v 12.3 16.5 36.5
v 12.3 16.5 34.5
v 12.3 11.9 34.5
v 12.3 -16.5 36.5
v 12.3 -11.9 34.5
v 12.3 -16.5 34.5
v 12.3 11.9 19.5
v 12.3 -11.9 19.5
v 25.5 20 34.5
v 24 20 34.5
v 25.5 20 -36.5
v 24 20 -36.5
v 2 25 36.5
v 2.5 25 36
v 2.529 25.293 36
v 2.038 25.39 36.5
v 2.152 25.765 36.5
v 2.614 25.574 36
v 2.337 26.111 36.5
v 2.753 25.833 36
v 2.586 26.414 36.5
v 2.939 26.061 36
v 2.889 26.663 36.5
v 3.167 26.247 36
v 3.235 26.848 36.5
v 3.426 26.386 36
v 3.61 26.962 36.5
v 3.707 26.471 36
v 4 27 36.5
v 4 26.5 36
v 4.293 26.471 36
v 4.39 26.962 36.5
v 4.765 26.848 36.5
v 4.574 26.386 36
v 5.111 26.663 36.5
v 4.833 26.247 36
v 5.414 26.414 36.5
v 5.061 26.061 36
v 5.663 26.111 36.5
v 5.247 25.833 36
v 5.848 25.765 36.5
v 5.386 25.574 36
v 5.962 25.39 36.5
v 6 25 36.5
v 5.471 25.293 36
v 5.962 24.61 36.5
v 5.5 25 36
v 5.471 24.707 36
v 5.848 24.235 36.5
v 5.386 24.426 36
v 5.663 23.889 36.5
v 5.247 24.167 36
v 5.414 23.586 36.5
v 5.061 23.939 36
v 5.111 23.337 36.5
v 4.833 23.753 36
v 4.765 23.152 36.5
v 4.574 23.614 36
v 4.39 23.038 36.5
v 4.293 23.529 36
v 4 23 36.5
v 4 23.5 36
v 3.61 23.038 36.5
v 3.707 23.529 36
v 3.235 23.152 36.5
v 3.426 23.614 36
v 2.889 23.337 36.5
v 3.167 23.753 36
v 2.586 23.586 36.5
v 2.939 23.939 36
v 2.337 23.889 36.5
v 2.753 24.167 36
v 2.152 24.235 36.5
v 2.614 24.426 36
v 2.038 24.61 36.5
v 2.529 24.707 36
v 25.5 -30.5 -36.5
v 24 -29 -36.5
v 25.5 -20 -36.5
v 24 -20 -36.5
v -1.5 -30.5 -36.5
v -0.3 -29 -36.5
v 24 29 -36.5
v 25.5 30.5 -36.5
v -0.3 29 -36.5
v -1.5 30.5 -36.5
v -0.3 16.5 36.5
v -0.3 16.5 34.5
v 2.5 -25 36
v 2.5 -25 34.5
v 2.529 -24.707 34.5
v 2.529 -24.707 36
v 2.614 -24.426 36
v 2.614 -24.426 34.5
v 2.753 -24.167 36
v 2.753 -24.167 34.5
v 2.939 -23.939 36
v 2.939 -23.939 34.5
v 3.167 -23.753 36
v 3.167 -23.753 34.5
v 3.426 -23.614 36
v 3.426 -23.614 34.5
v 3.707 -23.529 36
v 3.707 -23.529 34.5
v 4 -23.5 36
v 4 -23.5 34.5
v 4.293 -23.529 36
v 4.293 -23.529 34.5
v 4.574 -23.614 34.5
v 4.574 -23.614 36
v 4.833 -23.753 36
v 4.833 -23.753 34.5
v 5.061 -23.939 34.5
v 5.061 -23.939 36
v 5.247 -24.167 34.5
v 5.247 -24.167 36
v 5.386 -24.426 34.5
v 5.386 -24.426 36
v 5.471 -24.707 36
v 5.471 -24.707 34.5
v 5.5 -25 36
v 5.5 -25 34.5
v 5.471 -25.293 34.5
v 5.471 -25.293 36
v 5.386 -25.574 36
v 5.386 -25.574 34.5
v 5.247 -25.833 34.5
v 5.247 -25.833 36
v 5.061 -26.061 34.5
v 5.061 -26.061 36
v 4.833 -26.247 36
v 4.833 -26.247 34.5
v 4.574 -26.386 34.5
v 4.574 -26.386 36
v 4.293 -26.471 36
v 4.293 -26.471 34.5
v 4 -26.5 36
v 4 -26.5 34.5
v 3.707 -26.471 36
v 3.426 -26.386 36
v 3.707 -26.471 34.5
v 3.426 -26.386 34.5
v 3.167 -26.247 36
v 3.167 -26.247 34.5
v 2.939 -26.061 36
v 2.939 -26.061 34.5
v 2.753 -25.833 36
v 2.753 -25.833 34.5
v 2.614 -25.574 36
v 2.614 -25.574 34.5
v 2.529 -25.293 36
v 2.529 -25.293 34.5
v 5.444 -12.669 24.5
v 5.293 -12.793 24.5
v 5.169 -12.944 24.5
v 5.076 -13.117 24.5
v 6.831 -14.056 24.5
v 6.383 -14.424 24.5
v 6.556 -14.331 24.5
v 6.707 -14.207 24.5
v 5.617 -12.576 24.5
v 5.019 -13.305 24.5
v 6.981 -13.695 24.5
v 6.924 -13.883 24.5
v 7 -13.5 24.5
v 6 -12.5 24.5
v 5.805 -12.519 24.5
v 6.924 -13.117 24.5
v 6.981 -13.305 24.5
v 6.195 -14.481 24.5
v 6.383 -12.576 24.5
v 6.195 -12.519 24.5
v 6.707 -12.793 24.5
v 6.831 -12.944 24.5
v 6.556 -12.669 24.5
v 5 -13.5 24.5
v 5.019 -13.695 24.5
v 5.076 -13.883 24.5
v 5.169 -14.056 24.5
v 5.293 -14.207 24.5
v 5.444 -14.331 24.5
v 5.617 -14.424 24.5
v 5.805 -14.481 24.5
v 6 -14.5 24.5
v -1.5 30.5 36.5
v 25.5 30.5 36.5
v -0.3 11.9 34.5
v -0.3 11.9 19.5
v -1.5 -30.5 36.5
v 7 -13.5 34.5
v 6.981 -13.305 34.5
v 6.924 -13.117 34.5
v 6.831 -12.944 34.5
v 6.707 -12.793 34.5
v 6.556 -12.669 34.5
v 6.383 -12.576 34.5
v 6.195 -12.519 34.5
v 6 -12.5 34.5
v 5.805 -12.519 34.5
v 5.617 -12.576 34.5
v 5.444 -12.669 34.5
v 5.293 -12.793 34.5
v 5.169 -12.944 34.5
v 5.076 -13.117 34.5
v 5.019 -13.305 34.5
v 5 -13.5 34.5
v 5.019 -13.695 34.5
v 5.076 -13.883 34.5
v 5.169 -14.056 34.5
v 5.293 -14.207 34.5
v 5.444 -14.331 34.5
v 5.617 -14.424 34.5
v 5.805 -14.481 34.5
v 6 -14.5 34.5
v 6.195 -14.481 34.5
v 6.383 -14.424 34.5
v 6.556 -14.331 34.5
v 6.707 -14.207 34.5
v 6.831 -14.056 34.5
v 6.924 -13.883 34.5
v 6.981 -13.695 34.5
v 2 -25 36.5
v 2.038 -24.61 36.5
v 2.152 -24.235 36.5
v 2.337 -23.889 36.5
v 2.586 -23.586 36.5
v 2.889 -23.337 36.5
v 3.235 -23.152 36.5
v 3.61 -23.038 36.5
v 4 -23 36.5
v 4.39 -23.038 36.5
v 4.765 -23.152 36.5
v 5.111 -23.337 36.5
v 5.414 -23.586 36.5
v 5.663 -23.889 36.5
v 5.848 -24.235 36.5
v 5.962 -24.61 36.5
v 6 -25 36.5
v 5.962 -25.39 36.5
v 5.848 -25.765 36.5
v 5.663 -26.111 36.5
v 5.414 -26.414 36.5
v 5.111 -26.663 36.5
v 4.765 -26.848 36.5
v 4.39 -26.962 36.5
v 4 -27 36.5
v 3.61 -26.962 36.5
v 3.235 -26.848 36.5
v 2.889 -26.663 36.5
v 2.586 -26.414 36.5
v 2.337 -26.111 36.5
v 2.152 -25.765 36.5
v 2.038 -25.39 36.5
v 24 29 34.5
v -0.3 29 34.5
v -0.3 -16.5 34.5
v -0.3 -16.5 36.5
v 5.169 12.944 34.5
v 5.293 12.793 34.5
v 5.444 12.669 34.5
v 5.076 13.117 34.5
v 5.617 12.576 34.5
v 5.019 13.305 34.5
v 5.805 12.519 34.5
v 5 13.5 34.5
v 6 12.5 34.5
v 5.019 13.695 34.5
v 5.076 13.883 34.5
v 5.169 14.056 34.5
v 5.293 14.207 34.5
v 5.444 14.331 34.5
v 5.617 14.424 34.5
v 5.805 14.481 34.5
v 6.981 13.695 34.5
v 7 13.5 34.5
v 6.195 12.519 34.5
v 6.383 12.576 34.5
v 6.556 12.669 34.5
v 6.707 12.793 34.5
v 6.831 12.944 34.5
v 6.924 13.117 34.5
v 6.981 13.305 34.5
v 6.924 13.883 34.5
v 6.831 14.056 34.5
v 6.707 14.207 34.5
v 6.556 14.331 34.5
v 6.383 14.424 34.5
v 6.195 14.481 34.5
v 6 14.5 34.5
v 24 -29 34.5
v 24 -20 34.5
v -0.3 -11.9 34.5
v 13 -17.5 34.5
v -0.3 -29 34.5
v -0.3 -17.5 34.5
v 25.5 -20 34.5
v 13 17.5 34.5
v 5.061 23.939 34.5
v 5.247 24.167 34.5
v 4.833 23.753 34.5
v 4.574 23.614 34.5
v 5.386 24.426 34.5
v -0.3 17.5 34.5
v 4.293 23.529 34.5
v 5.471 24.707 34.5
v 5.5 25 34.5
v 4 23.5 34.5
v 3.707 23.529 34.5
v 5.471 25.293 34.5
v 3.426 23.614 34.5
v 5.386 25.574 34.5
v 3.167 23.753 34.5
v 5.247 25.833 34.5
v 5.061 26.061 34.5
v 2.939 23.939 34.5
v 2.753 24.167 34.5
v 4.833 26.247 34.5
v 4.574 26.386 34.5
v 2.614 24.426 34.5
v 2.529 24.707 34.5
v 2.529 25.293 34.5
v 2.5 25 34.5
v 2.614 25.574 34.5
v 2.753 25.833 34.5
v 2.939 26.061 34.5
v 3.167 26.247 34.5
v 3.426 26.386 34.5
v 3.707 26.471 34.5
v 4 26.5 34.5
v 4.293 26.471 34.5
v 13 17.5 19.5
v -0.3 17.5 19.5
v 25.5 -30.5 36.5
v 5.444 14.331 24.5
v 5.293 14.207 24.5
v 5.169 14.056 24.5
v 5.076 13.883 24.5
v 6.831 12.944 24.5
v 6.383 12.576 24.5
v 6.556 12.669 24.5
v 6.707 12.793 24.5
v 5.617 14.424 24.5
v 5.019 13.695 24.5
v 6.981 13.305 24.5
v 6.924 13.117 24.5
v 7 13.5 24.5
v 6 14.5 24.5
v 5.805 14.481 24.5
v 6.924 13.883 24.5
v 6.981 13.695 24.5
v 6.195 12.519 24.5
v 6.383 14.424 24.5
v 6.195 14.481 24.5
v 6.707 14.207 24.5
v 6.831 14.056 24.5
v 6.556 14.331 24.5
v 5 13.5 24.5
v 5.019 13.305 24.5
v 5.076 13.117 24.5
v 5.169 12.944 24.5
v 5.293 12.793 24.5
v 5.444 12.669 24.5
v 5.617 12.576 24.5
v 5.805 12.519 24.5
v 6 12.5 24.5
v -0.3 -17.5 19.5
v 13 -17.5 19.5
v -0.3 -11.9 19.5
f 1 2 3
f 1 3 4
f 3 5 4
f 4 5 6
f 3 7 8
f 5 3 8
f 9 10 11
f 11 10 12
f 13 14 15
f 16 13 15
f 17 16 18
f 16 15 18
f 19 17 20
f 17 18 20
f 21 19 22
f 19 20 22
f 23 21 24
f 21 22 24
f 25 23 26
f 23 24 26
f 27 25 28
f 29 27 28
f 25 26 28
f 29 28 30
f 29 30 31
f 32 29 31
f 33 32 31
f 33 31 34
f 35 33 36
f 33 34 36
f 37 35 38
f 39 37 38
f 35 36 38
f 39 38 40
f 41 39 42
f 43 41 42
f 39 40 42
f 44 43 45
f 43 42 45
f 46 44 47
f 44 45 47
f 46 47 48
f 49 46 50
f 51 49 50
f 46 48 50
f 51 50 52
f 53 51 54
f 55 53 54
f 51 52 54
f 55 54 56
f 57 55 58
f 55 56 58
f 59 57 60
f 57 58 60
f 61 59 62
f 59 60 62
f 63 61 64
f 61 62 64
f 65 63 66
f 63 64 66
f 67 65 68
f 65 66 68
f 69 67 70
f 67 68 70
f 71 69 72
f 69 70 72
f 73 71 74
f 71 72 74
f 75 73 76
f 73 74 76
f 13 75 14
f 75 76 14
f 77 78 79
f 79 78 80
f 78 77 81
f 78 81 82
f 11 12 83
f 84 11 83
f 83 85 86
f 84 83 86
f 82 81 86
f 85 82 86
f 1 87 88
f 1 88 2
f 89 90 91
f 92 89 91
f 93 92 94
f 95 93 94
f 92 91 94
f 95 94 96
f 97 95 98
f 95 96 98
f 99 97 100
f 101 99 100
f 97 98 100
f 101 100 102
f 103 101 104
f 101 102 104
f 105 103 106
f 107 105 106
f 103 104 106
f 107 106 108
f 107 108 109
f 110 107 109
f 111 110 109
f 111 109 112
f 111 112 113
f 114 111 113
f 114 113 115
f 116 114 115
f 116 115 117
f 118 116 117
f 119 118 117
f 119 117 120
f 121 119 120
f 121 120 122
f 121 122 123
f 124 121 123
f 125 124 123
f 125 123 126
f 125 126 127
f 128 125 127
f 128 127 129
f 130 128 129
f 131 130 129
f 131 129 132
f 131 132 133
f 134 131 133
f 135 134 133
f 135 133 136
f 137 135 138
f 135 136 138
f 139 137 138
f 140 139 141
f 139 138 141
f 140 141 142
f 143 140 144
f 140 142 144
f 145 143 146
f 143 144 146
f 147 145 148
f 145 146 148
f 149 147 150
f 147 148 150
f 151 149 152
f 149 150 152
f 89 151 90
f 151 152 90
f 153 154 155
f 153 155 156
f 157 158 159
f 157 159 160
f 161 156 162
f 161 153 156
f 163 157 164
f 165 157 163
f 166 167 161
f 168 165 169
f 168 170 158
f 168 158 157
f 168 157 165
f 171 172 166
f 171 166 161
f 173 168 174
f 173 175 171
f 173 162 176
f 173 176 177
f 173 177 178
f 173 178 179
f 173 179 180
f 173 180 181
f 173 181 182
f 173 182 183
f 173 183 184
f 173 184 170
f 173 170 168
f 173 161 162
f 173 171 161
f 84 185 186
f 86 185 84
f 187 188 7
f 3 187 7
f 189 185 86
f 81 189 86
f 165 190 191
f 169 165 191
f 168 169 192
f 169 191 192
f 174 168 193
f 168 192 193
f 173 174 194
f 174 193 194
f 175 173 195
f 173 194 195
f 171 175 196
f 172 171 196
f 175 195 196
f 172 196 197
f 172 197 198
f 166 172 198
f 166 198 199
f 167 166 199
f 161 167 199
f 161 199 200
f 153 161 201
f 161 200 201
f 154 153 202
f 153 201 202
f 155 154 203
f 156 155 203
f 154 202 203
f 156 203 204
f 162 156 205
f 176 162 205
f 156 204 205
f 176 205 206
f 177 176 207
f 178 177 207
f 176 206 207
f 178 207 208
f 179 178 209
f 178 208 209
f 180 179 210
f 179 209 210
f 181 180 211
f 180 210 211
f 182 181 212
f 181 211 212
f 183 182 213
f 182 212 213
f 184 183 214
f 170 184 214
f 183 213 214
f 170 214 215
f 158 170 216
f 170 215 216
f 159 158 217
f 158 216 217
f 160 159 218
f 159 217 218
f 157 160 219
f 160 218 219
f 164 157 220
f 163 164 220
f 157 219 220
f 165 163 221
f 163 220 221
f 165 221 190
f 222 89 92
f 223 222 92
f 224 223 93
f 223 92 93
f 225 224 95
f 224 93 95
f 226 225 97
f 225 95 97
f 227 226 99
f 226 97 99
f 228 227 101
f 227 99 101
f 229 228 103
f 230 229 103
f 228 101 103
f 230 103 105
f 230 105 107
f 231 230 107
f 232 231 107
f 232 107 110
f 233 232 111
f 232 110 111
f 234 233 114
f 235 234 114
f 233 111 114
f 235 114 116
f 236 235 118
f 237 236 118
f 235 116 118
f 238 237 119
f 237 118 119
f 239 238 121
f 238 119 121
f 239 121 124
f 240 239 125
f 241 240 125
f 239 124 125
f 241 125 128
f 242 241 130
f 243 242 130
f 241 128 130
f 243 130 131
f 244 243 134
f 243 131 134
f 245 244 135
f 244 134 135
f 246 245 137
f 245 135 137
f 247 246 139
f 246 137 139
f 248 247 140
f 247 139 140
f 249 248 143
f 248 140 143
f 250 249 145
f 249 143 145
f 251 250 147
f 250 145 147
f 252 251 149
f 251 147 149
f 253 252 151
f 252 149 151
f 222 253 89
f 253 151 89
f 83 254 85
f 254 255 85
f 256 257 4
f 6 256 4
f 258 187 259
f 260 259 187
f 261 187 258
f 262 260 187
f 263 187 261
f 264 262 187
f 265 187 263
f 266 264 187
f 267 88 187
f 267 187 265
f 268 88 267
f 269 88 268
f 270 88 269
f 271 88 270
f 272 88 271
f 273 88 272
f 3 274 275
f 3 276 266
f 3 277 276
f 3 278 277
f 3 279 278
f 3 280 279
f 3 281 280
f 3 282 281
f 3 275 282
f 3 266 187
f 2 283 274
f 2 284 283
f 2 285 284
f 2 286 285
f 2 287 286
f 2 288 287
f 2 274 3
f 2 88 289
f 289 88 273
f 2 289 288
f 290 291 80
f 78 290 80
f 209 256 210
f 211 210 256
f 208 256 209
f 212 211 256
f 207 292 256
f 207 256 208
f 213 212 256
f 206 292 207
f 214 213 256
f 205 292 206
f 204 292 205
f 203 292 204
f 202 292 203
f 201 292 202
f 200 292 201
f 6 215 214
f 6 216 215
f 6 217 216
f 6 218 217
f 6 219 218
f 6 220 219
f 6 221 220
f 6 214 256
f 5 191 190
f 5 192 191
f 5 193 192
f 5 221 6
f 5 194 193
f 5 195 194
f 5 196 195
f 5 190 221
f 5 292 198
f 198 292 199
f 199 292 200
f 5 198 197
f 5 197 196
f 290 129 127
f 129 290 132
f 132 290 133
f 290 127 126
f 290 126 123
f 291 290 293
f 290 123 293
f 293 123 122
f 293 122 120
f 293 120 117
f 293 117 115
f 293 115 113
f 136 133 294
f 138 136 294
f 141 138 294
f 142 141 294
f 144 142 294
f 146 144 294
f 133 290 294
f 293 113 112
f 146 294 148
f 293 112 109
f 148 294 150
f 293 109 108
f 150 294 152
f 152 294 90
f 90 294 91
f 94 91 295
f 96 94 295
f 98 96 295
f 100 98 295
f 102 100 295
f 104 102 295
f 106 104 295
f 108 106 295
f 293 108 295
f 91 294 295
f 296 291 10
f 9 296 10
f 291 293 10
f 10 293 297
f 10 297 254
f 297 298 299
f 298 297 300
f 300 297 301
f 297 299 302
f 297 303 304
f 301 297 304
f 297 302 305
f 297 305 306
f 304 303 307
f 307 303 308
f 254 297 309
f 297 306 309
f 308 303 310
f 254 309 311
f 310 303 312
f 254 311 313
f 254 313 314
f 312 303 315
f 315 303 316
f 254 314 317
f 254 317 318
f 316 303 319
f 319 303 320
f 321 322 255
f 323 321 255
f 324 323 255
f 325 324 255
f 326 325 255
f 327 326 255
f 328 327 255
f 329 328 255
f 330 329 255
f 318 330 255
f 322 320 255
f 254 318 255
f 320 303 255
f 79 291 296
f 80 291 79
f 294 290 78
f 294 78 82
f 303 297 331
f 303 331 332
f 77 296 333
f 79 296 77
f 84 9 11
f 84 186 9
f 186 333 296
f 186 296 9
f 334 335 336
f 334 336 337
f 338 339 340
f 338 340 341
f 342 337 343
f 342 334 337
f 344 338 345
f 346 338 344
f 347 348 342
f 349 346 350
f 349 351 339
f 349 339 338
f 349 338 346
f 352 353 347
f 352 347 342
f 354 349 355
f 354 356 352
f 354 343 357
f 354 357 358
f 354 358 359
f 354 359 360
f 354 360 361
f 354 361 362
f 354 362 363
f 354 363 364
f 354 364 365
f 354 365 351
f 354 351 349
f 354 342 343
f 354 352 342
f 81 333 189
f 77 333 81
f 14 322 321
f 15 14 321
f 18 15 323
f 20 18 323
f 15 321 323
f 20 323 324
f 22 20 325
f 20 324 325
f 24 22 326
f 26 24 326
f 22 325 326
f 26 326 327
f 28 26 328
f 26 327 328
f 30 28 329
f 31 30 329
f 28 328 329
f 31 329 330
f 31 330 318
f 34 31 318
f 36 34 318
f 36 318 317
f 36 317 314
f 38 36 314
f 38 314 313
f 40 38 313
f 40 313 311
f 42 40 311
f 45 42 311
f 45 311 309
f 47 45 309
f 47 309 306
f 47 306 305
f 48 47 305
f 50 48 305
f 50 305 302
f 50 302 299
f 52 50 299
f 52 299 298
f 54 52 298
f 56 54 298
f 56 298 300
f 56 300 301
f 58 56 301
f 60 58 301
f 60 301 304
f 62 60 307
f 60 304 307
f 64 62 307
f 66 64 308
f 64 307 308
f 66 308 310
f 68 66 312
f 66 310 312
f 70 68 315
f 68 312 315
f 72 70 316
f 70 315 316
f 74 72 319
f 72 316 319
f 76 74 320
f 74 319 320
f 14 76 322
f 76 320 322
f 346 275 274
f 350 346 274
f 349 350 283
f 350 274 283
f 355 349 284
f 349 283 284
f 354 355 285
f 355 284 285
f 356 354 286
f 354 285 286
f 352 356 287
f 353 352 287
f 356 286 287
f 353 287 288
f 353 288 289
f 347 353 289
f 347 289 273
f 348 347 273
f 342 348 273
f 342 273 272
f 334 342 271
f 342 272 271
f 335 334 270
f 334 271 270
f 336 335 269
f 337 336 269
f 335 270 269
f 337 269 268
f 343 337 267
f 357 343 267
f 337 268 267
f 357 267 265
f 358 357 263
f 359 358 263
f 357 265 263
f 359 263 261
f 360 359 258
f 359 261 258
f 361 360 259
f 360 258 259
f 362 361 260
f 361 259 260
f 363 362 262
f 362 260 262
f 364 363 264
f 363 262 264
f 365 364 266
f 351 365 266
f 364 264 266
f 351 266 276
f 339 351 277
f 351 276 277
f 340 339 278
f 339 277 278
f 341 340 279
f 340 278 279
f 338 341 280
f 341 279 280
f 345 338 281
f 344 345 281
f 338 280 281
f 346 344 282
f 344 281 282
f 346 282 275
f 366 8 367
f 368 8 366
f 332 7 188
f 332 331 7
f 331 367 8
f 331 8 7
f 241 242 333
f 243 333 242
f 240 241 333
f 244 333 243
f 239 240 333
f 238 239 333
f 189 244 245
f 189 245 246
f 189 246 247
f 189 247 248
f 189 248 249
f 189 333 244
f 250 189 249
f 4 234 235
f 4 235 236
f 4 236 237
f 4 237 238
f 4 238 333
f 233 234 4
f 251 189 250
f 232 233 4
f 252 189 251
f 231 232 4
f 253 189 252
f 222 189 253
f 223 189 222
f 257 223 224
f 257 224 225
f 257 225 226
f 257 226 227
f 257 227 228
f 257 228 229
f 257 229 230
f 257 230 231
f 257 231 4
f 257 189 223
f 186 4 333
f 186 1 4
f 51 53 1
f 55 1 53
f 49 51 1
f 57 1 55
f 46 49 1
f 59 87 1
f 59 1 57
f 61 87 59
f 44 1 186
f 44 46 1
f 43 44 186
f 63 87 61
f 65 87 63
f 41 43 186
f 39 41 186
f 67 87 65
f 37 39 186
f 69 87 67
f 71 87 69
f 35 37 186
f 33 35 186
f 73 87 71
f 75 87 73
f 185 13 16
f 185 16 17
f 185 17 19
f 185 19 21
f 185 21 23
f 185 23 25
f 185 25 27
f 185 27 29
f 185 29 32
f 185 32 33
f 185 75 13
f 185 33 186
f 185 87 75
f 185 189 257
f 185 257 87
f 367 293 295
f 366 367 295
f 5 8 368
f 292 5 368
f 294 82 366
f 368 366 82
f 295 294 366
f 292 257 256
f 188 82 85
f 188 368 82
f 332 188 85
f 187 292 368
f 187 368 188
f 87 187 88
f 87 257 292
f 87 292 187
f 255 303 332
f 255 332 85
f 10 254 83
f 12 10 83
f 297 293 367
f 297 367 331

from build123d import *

# Parameters (mm, degrees)
SKETCH_1_W           = 73
SKETCH_1_H           = 61
EXTRUDE_1_DEPTH      = 1.5
SKETCH_3_W           = 73
SKETCH_3_H           = 1.5
EXTRUDE_2_DEPTH      = 24
SKETCH_4_W           = 24
SKETCH_4_H           = 58
EXTRUDE_8_DEPTH      = 2
SKETCH_18_W          = 12
SKETCH_18_H          = 23
CUT_EXTRUDE_10_DEPTH = 2
SKETCH_19_W          = 12
SKETCH_19_H          = 6
EXTRUDE_9_DEPTH      = 15
SKETCH_21_W          = 1
SKETCH_21_H          = 35
EXTRUDE_10_DEPTH     = 15
SKETCH_24_W          = 12
SKETCH_24_H          = 5
CUT_EXTRUDE_12_DEPTH = 2
SKETCH_25_R          = 1
CUT_EXTRUDE_13_DEPTH = 10
SKETCH_28_W          = 73
SKETCH_28_H          = 10.5
EXTRUDE_11_DEPTH     = 1.5
SKETCH_31_W          = 2
SKETCH_31_H          = 40
EXTRUDE_12_DEPTH     = 1.5
SKETCH_32_R          = 1.5
CUT_EXTRUDE_14_DEPTH = 5
CHAMFER_1_SIZE       = 0.5
CHAMFER_2_SIZE       = 0.5
SKETCH_33_W          = 12
SKETCH_33_H          = 23
CUT_EXTRUDE_15_DEPTH = 48
SKETCH_34_W          = 0.3
SKETCH_34_H          = 58
CUT_EXTRUDE_16_DEPTH = 56
SKETCH_35_W          = 0.3
SKETCH_35_H          = 11.5
CUT_EXTRUDE_17_DEPTH = 15
SKETCH_36_W          = 12.6
SKETCH_36_H          = 4.6
CUT_EXTRUDE_18_DEPTH = 2


with BuildPart() as part:
    # 草图1 → 凸台-拉伸1 (new body)
    with BuildSketch(Plane(origin=(0, 0, 0), x_dir=(0, 0, -1), z_dir=(1, 0, 0))):
        Rectangle(SKETCH_1_W, SKETCH_1_H)
    extrude(amount=-EXTRUDE_1_DEPTH)

    # 草图3 → 凸台-拉伸2 (add)
    with BuildSketch(Plane(origin=(0, 0, 0), x_dir=(0, 0, -1), z_dir=(1, 0, 0))):
        with Locations((0, 29.75)):
            Rectangle(SKETCH_3_W, SKETCH_3_H)
        with Locations((0, -29.75)):
            Rectangle(SKETCH_3_W, SKETCH_3_H)
    extrude(amount=EXTRUDE_2_DEPTH)

    # 草图4 → 凸台-拉伸8 (add)
    with BuildSketch(Plane.XY.offset(36.5)):
        with Locations((12, 0)):
            Rectangle(SKETCH_4_W, SKETCH_4_H)
    extrude(amount=-EXTRUDE_8_DEPTH)

    # 草图18 → 切除-拉伸10 (cut)
    with BuildSketch(Plane(origin=(0, 0, 34.5), x_dir=(-1, 0, 0), z_dir=(0, 0, -1))):
        with Locations((-6, 0)):
            Rectangle(SKETCH_18_W, SKETCH_18_H)
    extrude(amount=-CUT_EXTRUDE_10_DEPTH, mode=Mode.SUBTRACT)

    # 草图19 → 凸台-拉伸9 (add)
    with BuildSketch(Plane(origin=(0, 0, 34.5), x_dir=(-1, 0, 0), z_dir=(0, 0, -1))):
        with Locations((-6, 14.5)):
            Rectangle(SKETCH_19_W, SKETCH_19_H)
        with Locations((-6, -14.5)):
            Rectangle(SKETCH_19_W, SKETCH_19_H)
    extrude(amount=EXTRUDE_9_DEPTH)

    # 草图21 → 凸台-拉伸10 (add)
    with BuildSketch(Plane(origin=(0, 0, 34.5), x_dir=(-1, 0, 0), z_dir=(0, 0, -1))):
        with Locations((-12.5, 0)):
            Rectangle(SKETCH_21_W, SKETCH_21_H)
    extrude(amount=EXTRUDE_10_DEPTH)

    # 草图24 → 切除-拉伸12 (cut)
    with BuildSketch(Plane.XY.offset(36.5)):
        with Locations((6, 14)):
            Rectangle(SKETCH_24_W, SKETCH_24_H)
        with Locations((6, -14)):
            Rectangle(SKETCH_24_W, SKETCH_24_H)
    extrude(amount=-CUT_EXTRUDE_12_DEPTH, mode=Mode.SUBTRACT)

    # 草图25 → 切除-拉伸13 (cut)
    with BuildSketch(Plane.XY.offset(34.5)):
        with Locations((6, 13.5)):
            Circle(SKETCH_25_R)
        with Locations((6, -13.5)):
            Circle(SKETCH_25_R)
    extrude(amount=-CUT_EXTRUDE_13_DEPTH, mode=Mode.SUBTRACT)

    # 草图28 → 凸台-拉伸11 (add)
    with BuildSketch(Plane(origin=(24, 0, 0), x_dir=(0, 0, -1), z_dir=(1, 0, 0))):
        with Locations((0, 25.25)):
            Rectangle(SKETCH_28_W, SKETCH_28_H)
        with Locations((0, -25.25)):
            Rectangle(SKETCH_28_W, SKETCH_28_H)
    extrude(amount=EXTRUDE_11_DEPTH)

    # 草图31 → 凸台-拉伸12 (add)
    with BuildSketch(Plane(origin=(24, 0, 0), x_dir=(0, 0, -1), z_dir=(1, 0, 0))):
        with Locations((-35.5, 0)):
            Rectangle(SKETCH_31_W, SKETCH_31_H)
    extrude(amount=EXTRUDE_12_DEPTH)

    # 草图32 → 切除-拉伸14 (cut)
    with BuildSketch(Plane(origin=(0, 0, 34.5), x_dir=(-1, 0, 0), z_dir=(0, 0, -1))):
        with Locations((-4, 25)):
            Circle(SKETCH_32_R)
        with Locations((-4, -25)):
            Circle(SKETCH_32_R)
    extrude(amount=-CUT_EXTRUDE_14_DEPTH, mode=Mode.SUBTRACT)

    # 倒角1
    chamfer_1_edges = [part.edges().sort_by_distance(p)[0] for p in [
        (5.5, 25, 36.5),
    ]]
    chamfer(chamfer_1_edges, length=CHAMFER_1_SIZE)

    # 倒角2
    chamfer_2_edges = [part.edges().sort_by_distance(p)[0] for p in [
        (5.5, -25, 36.5),
    ]]
    chamfer(chamfer_2_edges, length=CHAMFER_2_SIZE)

    # 草图33 → 切除-拉伸15 (cut)
    with BuildSketch(Plane(origin=(0, 0, 19.5), x_dir=(-1, 0, 0), z_dir=(0, 0, -1))):
        Polygon((0, 11.9), (-12.3, 11.9), (-12.3, -11.9), (0, -11.9), (0.3, -11.9), (0.3, 11.9), align=None)
        with Locations((-6, 0)):
            Rectangle(SKETCH_33_W, SKETCH_33_H, mode=Mode.SUBTRACT)
    extrude(amount=-CUT_EXTRUDE_15_DEPTH, mode=Mode.SUBTRACT)

    # 草图34 → 切除-拉伸16 (cut)
    with BuildSketch(Plane(origin=(0, 0, -36.5), x_dir=(-1, 0, 0), z_dir=(0, 0, -1))):
        with Locations((0.15, 0)):
            Rectangle(SKETCH_34_W, SKETCH_34_H)
    extrude(amount=-CUT_EXTRUDE_16_DEPTH, mode=Mode.SUBTRACT)

    # 草图35 → 切除-拉伸17 (cut)
    with BuildSketch(Plane(origin=(0, 0, 19.5), x_dir=(-1, 0, 0), z_dir=(0, 0, -1))):
        with Locations((0.15, 23.25)):
            Rectangle(SKETCH_35_W, SKETCH_35_H)
        with Locations((0.15, -23.25)):
            Rectangle(SKETCH_35_W, SKETCH_35_H)
    extrude(amount=-CUT_EXTRUDE_17_DEPTH, mode=Mode.SUBTRACT)

    # 草图36 → 切除-拉伸18 (cut)
    with BuildSketch(Plane.XY.offset(36.5)):
        with Locations((6, -14.2)):
            Rectangle(SKETCH_36_W, SKETCH_36_H)
        with Locations((6, 14.2)):
            Rectangle(SKETCH_36_W, SKETCH_36_H)
    extrude(amount=-CUT_EXTRUDE_18_DEPTH, mode=Mode.SUBTRACT)


solid = part.part
